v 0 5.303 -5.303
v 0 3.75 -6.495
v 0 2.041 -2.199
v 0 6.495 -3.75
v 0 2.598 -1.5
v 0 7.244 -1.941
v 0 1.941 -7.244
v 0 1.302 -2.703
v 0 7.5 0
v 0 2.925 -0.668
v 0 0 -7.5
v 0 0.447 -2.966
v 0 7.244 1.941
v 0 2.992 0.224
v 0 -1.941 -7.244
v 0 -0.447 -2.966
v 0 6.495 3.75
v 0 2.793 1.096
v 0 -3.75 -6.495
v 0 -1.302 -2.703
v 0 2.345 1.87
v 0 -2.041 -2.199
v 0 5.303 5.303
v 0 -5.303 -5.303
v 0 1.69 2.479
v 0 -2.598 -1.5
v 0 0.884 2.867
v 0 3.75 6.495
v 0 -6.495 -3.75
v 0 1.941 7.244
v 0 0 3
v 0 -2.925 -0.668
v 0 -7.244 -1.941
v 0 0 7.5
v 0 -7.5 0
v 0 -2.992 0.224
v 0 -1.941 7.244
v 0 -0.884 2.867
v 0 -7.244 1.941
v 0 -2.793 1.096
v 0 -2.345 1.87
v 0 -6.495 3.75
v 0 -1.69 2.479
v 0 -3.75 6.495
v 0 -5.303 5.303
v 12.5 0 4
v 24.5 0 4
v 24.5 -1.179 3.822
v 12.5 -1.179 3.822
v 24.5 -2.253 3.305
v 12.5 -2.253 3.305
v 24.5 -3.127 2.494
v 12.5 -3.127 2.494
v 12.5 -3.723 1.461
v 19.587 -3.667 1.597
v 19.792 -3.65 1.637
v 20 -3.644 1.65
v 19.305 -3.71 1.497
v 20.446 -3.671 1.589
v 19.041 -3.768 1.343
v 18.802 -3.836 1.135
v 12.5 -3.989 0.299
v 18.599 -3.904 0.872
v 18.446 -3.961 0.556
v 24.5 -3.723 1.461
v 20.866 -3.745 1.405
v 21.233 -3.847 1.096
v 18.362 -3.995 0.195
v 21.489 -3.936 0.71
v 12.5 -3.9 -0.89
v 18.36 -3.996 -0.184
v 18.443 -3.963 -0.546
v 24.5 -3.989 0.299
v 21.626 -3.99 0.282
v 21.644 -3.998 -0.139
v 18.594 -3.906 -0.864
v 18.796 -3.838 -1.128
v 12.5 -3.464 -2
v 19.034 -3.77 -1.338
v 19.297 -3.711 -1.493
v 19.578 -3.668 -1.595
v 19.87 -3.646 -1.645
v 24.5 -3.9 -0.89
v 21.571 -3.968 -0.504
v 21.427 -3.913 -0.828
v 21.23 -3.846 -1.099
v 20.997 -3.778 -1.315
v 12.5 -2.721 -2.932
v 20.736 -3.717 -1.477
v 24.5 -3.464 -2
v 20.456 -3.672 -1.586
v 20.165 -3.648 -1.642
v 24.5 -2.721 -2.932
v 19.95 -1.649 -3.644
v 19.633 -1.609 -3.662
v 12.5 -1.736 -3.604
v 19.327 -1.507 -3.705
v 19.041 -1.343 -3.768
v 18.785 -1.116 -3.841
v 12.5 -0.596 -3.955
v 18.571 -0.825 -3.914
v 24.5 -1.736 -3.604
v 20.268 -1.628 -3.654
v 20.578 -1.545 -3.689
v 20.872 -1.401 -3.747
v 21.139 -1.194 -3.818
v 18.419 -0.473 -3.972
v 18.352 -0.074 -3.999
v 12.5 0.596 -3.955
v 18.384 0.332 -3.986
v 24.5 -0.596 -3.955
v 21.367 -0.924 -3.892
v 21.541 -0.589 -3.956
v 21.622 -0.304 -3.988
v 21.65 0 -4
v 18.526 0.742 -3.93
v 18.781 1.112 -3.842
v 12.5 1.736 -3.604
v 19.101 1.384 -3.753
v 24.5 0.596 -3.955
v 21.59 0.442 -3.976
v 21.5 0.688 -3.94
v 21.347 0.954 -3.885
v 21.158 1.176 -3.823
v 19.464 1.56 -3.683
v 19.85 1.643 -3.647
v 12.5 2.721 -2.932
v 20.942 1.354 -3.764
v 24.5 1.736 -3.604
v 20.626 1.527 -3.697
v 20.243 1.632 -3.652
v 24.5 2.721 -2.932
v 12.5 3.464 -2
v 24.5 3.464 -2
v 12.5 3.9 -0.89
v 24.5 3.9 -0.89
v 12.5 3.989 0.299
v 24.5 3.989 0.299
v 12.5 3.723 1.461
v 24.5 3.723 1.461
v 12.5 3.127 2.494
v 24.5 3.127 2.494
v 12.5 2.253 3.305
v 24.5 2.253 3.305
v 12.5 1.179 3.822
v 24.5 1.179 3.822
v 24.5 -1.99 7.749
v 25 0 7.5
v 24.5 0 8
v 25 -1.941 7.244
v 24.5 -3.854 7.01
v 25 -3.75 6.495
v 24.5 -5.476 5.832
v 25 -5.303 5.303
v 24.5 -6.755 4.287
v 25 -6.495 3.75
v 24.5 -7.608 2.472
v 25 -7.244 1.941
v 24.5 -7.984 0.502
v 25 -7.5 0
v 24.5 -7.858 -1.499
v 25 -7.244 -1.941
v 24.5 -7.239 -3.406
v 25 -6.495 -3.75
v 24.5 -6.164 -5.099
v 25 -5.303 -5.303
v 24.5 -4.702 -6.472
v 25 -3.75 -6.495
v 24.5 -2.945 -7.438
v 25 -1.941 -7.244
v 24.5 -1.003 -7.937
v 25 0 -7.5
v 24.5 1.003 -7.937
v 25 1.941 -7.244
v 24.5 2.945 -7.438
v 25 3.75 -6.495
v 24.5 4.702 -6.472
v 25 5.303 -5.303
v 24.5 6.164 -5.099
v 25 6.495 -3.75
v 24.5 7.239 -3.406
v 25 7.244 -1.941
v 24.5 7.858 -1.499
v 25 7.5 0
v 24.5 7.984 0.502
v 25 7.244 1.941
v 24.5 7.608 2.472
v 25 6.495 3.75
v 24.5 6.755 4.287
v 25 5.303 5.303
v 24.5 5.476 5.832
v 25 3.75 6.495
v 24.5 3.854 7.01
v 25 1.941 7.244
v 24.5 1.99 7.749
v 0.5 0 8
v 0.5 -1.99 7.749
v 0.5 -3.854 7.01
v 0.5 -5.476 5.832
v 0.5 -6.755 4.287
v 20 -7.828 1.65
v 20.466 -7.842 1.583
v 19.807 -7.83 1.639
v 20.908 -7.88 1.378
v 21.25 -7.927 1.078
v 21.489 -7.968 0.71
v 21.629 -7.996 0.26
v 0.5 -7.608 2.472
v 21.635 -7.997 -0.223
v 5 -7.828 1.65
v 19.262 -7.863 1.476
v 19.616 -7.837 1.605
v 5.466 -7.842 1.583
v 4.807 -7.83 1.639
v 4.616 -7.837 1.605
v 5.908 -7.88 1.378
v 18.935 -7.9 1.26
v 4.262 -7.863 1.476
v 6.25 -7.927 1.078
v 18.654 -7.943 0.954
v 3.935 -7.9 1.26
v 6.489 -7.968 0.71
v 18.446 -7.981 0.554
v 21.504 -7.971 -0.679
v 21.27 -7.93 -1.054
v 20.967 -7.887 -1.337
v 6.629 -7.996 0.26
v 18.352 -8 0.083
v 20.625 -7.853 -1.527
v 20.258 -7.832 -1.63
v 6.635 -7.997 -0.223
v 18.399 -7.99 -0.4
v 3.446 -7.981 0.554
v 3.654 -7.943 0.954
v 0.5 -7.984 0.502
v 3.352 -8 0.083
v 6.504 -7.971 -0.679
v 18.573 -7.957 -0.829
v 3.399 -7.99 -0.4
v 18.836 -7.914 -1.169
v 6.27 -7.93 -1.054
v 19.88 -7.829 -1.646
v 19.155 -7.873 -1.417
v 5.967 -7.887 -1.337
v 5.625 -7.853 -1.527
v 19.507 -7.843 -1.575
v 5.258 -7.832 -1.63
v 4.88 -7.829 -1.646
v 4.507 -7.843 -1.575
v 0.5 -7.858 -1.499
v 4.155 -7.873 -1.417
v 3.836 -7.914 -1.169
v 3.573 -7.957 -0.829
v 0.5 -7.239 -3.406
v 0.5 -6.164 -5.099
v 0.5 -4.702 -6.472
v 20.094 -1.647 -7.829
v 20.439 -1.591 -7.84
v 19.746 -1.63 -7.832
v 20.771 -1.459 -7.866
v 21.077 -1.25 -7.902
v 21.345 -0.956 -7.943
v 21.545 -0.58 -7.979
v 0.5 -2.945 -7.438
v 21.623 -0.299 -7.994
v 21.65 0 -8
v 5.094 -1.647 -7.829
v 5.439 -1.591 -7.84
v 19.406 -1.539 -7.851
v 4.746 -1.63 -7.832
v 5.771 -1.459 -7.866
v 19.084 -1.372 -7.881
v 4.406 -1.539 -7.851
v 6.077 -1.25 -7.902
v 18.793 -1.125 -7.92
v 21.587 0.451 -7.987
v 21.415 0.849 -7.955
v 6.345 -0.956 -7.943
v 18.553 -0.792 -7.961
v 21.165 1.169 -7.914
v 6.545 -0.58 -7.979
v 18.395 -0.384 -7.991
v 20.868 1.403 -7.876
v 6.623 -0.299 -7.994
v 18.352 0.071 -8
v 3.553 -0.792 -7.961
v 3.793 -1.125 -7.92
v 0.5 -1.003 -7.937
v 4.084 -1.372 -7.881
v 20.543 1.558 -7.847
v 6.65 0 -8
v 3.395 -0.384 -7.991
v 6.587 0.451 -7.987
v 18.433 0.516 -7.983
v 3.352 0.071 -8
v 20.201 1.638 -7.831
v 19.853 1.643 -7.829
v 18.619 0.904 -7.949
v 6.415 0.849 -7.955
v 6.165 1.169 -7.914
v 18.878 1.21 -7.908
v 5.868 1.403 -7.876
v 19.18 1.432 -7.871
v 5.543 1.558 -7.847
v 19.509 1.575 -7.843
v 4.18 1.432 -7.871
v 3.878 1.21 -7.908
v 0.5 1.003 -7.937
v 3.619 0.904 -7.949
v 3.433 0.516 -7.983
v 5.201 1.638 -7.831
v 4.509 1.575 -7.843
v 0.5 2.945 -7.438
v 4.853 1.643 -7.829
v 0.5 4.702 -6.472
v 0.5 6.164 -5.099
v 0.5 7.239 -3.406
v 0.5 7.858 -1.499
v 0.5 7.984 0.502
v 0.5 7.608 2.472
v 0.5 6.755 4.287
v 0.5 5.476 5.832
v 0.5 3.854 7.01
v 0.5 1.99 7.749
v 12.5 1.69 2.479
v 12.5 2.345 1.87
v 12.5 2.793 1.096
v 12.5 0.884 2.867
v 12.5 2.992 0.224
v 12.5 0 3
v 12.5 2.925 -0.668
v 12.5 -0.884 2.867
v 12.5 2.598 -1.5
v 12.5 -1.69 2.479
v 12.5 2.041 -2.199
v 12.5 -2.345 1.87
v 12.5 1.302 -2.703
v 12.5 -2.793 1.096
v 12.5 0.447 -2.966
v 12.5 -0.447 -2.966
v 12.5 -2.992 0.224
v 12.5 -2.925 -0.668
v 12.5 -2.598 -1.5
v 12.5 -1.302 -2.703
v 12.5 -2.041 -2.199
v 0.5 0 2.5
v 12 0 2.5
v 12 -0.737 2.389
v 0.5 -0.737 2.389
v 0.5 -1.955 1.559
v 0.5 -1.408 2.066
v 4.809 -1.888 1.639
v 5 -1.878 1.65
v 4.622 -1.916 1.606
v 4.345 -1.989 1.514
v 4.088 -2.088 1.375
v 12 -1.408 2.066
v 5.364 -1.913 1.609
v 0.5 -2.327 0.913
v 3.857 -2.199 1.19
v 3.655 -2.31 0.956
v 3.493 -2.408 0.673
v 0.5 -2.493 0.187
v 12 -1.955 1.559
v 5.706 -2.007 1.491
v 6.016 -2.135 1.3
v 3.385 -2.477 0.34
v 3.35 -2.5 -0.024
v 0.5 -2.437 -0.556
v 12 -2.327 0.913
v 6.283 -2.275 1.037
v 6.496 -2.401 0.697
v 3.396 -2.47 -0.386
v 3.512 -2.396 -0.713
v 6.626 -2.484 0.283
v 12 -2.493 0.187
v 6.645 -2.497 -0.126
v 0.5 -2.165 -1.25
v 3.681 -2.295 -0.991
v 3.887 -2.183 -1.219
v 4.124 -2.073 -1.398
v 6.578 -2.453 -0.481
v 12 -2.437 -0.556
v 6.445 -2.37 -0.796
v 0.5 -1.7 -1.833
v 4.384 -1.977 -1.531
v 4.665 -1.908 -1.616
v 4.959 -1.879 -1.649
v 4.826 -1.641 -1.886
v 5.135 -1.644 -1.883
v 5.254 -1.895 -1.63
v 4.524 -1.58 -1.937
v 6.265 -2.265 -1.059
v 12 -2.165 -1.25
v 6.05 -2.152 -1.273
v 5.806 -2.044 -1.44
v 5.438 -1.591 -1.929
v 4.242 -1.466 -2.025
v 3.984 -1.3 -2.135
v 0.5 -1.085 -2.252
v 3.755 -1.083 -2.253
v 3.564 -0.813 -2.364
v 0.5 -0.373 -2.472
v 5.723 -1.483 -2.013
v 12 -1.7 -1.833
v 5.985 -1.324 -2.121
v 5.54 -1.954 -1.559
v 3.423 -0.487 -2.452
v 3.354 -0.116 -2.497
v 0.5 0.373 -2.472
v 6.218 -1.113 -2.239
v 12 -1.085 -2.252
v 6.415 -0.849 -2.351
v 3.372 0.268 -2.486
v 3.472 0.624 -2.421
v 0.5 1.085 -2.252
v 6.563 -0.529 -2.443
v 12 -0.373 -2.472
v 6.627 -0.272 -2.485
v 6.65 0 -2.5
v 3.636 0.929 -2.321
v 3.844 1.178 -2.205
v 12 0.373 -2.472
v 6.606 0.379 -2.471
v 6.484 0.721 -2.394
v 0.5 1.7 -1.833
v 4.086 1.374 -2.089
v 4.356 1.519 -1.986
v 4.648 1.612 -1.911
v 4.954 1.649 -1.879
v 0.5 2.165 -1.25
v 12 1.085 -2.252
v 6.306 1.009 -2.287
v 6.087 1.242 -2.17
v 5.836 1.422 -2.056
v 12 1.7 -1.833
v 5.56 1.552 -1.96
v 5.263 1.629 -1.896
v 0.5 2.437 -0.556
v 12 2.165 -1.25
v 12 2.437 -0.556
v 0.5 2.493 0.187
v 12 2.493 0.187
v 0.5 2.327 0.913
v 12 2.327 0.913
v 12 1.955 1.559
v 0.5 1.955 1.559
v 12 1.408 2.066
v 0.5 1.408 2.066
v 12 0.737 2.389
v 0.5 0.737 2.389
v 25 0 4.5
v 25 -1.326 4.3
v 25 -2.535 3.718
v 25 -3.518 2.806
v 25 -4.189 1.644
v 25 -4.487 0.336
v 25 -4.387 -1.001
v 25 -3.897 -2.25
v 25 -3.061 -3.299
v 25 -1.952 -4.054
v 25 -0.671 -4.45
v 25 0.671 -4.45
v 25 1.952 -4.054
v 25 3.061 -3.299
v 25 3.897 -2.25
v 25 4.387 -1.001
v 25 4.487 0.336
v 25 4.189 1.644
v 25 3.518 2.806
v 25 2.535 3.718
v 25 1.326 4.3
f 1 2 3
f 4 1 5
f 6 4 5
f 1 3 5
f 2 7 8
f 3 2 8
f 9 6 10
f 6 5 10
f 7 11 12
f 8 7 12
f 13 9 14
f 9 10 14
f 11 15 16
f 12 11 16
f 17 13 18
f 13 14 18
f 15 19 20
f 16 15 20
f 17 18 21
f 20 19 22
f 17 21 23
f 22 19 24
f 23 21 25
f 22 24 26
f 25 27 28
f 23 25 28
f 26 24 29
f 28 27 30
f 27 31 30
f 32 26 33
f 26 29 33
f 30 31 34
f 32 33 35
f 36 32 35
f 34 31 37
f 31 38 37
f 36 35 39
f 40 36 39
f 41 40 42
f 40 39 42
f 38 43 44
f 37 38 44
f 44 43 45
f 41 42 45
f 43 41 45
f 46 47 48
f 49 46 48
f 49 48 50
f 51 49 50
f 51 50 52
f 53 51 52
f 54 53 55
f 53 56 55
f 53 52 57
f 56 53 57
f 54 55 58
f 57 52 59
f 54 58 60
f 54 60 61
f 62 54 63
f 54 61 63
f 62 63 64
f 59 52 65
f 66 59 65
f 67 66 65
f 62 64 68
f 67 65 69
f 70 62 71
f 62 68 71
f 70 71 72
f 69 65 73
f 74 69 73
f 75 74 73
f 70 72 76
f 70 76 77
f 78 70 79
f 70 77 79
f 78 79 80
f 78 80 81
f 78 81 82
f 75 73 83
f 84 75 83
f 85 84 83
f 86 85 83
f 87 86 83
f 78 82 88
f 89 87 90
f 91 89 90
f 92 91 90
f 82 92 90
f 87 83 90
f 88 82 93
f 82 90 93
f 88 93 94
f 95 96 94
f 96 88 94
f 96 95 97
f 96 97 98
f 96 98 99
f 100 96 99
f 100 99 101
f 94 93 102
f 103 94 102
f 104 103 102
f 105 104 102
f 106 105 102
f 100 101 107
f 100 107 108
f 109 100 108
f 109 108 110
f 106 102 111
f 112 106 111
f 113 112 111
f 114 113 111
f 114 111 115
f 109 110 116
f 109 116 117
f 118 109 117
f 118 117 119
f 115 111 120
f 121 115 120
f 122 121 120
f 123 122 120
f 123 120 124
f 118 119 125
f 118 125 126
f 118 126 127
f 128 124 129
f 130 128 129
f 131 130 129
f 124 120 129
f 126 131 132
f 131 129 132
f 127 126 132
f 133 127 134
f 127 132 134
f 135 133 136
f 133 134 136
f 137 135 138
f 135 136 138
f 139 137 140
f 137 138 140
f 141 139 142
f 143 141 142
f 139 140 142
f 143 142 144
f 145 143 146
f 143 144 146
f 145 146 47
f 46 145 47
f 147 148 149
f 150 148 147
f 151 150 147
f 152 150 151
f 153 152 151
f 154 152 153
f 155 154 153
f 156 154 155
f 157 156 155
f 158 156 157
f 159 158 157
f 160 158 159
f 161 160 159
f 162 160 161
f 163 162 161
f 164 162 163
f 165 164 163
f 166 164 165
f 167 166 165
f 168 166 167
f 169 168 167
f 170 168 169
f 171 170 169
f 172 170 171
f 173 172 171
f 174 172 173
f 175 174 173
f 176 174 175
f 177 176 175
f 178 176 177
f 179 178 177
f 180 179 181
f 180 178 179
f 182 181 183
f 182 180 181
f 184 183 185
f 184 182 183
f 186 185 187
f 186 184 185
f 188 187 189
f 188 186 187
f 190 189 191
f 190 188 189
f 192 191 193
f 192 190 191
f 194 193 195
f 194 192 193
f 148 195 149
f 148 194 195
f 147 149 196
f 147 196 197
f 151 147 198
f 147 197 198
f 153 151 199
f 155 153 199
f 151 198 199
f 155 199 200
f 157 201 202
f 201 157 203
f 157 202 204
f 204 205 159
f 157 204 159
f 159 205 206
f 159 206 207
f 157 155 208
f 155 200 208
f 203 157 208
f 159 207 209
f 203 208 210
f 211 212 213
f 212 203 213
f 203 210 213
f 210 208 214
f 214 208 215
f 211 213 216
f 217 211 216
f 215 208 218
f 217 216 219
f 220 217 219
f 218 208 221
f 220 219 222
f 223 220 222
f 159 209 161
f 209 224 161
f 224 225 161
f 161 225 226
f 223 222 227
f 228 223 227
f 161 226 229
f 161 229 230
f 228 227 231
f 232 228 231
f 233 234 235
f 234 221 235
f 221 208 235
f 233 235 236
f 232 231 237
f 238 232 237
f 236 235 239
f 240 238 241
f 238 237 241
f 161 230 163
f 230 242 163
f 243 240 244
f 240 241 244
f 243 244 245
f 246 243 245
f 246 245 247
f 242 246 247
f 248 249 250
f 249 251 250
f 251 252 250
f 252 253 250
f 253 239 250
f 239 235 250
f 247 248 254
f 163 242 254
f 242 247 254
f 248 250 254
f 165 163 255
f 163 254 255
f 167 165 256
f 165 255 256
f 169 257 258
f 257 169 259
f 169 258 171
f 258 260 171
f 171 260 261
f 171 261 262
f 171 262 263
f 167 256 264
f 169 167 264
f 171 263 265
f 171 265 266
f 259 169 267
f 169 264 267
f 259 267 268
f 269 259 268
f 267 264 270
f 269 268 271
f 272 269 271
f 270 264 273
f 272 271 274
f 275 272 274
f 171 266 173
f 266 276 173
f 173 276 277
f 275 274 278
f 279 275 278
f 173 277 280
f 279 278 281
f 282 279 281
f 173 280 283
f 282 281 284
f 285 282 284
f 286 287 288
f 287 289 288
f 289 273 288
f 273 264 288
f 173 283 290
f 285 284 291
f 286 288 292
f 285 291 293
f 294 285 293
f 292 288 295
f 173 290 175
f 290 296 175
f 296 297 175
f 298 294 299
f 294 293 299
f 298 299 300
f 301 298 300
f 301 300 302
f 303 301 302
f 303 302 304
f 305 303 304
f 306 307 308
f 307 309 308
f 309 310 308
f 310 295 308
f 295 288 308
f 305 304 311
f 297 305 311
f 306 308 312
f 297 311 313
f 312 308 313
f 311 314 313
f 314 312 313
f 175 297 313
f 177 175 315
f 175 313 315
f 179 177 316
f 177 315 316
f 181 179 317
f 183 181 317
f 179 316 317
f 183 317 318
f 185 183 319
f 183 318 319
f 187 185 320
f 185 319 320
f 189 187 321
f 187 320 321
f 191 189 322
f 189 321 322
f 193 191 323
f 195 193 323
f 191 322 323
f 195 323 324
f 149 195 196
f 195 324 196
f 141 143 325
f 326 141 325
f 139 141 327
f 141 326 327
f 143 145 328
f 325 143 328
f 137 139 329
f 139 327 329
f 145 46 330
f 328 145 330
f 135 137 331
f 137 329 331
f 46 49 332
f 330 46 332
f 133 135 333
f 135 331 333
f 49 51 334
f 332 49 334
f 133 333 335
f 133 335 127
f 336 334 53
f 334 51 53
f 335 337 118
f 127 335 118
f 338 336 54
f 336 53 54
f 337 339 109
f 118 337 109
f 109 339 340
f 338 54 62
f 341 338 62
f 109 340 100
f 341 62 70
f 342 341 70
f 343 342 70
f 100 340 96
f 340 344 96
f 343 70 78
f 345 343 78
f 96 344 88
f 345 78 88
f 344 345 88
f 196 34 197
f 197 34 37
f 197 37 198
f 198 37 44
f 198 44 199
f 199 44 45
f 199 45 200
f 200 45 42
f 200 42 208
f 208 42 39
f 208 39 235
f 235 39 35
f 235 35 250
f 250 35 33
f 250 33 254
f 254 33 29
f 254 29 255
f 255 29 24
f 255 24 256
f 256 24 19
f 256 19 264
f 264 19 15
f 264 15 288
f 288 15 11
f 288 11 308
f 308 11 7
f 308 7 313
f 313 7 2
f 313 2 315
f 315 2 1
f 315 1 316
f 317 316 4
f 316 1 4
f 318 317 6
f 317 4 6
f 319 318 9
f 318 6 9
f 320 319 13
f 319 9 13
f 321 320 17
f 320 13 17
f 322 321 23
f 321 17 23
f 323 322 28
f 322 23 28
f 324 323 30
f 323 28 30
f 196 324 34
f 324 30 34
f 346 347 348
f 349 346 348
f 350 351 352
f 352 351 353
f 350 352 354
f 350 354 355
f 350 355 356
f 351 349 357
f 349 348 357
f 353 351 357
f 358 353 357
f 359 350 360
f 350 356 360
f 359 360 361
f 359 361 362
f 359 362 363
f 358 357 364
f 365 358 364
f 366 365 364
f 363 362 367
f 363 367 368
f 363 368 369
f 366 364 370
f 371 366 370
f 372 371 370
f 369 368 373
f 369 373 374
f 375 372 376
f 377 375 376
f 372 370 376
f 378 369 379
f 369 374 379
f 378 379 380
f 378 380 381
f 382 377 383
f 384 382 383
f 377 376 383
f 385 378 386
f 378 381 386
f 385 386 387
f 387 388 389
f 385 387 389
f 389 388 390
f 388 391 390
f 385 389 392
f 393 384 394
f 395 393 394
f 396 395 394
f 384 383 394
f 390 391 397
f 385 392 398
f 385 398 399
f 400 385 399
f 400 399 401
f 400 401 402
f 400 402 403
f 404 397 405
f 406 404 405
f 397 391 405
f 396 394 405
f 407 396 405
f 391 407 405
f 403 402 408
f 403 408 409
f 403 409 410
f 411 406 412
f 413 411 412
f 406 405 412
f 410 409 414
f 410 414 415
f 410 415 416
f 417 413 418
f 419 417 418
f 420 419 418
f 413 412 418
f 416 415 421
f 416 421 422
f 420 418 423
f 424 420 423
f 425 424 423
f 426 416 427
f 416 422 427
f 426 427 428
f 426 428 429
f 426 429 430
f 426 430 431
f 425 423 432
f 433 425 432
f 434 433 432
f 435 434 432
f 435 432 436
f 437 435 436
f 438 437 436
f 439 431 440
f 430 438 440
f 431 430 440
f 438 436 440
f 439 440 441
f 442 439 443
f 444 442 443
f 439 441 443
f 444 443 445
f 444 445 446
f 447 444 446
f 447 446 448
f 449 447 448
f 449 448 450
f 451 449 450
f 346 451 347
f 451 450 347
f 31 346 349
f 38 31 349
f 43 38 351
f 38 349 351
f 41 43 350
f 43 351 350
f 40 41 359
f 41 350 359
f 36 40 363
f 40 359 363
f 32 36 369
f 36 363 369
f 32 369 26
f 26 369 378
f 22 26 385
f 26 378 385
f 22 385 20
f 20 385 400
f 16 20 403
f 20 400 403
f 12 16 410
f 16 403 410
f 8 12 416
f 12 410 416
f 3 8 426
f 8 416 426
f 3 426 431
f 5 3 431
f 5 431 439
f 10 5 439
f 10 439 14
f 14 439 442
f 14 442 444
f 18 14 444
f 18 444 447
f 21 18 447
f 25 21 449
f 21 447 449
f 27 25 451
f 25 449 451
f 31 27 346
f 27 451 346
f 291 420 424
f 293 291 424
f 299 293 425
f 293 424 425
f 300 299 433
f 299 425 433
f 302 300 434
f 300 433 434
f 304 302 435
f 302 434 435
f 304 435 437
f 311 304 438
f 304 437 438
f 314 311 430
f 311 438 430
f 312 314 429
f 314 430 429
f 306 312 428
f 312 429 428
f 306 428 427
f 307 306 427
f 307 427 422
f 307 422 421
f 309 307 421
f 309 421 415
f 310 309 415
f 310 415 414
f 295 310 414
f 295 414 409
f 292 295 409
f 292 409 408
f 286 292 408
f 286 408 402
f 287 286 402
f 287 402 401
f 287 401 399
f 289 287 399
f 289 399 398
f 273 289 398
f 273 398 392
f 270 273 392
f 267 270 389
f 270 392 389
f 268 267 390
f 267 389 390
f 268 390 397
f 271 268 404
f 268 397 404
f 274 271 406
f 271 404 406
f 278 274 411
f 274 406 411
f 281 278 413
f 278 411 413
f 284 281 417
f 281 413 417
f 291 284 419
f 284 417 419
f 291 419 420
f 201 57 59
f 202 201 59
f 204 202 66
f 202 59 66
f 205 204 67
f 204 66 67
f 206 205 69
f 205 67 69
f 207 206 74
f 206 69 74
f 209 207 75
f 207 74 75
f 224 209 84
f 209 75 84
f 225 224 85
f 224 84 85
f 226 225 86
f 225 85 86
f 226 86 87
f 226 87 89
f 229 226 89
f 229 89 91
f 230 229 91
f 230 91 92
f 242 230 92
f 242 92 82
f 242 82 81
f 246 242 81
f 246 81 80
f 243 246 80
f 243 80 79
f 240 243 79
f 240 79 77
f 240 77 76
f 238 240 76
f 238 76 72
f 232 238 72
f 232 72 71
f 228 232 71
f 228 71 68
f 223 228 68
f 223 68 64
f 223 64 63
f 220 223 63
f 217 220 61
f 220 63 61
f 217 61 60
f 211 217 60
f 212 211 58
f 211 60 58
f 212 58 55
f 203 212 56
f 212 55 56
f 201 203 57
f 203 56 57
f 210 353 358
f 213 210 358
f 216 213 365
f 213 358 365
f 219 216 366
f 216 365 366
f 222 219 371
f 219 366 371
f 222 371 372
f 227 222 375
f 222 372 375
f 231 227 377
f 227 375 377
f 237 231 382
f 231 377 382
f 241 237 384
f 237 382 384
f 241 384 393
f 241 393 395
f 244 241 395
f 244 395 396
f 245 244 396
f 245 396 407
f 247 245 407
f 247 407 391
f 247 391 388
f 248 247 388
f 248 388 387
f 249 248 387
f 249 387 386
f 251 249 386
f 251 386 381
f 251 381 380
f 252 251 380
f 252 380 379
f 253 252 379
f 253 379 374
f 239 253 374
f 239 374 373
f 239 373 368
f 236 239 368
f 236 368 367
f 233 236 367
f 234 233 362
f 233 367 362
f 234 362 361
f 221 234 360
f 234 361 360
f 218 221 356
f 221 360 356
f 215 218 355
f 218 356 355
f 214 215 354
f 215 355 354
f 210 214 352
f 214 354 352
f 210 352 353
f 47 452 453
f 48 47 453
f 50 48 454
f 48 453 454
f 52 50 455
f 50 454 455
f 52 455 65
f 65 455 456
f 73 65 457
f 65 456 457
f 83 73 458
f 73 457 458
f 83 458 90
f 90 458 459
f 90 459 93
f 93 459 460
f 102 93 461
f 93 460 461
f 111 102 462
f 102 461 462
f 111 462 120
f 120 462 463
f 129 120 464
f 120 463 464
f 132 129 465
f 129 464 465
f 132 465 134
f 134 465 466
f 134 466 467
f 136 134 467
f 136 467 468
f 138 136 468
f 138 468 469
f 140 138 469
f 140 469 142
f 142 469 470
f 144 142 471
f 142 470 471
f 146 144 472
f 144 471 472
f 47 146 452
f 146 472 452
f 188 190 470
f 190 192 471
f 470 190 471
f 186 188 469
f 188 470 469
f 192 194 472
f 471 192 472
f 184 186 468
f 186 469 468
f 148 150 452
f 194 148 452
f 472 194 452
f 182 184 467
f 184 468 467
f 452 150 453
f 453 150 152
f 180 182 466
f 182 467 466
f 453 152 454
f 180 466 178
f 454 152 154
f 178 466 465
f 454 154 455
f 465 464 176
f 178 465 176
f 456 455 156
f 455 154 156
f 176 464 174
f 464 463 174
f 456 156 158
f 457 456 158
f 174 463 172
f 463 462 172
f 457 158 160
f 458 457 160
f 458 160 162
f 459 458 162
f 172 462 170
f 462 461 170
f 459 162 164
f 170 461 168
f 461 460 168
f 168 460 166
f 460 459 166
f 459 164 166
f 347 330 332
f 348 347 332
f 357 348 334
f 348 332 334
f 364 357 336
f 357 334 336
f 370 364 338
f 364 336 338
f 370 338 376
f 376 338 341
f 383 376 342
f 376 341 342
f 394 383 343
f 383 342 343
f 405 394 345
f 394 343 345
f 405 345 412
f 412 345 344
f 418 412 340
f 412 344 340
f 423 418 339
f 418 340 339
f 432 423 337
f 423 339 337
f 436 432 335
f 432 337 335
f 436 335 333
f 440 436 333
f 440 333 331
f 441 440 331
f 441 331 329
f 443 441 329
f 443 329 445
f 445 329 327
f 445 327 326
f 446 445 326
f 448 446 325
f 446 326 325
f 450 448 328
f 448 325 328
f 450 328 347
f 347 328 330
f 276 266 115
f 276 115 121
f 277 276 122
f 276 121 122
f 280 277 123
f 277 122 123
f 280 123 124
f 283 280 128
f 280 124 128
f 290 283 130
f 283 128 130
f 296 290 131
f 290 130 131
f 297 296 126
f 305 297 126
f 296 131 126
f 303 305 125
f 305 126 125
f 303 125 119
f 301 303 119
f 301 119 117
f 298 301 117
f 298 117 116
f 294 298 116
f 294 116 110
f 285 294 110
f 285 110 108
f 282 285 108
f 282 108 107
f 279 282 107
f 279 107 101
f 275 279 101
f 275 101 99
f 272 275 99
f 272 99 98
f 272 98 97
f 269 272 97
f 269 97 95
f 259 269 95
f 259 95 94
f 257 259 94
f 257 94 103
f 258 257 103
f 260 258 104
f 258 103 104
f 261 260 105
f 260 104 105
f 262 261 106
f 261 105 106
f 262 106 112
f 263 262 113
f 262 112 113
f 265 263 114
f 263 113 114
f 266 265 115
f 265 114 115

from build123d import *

# Parameters (mm, degrees)
CHAMFER_1_SIZE      = 0.5
SKETCH_2_R          = 1.65
CUT_EXTRUDE_1_DEPTH = 10
SKETCH_3_R          = 1.65
CUT_EXTRUDE_2_DEPTH = 10


with BuildPart() as part:
    # 草图1 → 旋转1 (revolve)
    with BuildSketch(Plane(origin=(0, 0, 0), x_dir=(1, 0, 0), z_dir=(0, 1, 0)), mode=Mode.PRIVATE) as revolve_1_sk:
        Polygon((25, 8), (0, 8), (0, 2.5), (12.5, 2.5), (12.5, 4), (25, 4), align=None)
    revolve(revolve_1_sk.sketch.rotate(Axis((-10.524691358, 0, 0), (1, 0, 0)), 180), axis=Axis((-10.524691358, 0, 0), (1, 0, 0)))

    # 倒角1
    chamfer_1_edges = [part.edges().sort_by_distance(p)[0] for p in [
        (25, 0, -4),
        (12.5, 0, -2.5),
        (0, 0, -2.5),
        (0, 0, -8),
        (25, 0, -8),
    ]]
    chamfer(chamfer_1_edges, length=CHAMFER_1_SIZE)

    # 草图2 → 切除-拉伸1 (cut)
    with BuildSketch(Plane(origin=(0, 0, 0), x_dir=(1, 0, 0), z_dir=(0, 1, 0))):
        with Locations(Location((5, 0, 0), (0, 0, 270))):
            Circle(SKETCH_2_R)
        with Locations(Location((20, 0, 0), (0, 0, 270))):
            Circle(SKETCH_2_R)
    extrude(amount=-CUT_EXTRUDE_1_DEPTH, mode=Mode.SUBTRACT)

    # 草图3 → 切除-拉伸2 (cut)
    with BuildSketch(Plane.XY):
        with Locations((5, 0)):
            Circle(SKETCH_3_R)
        with Locations((20, 0)):
            Circle(SKETCH_3_R)
    extrude(amount=-CUT_EXTRUDE_2_DEPTH, mode=Mode.SUBTRACT)


solid = part.part
